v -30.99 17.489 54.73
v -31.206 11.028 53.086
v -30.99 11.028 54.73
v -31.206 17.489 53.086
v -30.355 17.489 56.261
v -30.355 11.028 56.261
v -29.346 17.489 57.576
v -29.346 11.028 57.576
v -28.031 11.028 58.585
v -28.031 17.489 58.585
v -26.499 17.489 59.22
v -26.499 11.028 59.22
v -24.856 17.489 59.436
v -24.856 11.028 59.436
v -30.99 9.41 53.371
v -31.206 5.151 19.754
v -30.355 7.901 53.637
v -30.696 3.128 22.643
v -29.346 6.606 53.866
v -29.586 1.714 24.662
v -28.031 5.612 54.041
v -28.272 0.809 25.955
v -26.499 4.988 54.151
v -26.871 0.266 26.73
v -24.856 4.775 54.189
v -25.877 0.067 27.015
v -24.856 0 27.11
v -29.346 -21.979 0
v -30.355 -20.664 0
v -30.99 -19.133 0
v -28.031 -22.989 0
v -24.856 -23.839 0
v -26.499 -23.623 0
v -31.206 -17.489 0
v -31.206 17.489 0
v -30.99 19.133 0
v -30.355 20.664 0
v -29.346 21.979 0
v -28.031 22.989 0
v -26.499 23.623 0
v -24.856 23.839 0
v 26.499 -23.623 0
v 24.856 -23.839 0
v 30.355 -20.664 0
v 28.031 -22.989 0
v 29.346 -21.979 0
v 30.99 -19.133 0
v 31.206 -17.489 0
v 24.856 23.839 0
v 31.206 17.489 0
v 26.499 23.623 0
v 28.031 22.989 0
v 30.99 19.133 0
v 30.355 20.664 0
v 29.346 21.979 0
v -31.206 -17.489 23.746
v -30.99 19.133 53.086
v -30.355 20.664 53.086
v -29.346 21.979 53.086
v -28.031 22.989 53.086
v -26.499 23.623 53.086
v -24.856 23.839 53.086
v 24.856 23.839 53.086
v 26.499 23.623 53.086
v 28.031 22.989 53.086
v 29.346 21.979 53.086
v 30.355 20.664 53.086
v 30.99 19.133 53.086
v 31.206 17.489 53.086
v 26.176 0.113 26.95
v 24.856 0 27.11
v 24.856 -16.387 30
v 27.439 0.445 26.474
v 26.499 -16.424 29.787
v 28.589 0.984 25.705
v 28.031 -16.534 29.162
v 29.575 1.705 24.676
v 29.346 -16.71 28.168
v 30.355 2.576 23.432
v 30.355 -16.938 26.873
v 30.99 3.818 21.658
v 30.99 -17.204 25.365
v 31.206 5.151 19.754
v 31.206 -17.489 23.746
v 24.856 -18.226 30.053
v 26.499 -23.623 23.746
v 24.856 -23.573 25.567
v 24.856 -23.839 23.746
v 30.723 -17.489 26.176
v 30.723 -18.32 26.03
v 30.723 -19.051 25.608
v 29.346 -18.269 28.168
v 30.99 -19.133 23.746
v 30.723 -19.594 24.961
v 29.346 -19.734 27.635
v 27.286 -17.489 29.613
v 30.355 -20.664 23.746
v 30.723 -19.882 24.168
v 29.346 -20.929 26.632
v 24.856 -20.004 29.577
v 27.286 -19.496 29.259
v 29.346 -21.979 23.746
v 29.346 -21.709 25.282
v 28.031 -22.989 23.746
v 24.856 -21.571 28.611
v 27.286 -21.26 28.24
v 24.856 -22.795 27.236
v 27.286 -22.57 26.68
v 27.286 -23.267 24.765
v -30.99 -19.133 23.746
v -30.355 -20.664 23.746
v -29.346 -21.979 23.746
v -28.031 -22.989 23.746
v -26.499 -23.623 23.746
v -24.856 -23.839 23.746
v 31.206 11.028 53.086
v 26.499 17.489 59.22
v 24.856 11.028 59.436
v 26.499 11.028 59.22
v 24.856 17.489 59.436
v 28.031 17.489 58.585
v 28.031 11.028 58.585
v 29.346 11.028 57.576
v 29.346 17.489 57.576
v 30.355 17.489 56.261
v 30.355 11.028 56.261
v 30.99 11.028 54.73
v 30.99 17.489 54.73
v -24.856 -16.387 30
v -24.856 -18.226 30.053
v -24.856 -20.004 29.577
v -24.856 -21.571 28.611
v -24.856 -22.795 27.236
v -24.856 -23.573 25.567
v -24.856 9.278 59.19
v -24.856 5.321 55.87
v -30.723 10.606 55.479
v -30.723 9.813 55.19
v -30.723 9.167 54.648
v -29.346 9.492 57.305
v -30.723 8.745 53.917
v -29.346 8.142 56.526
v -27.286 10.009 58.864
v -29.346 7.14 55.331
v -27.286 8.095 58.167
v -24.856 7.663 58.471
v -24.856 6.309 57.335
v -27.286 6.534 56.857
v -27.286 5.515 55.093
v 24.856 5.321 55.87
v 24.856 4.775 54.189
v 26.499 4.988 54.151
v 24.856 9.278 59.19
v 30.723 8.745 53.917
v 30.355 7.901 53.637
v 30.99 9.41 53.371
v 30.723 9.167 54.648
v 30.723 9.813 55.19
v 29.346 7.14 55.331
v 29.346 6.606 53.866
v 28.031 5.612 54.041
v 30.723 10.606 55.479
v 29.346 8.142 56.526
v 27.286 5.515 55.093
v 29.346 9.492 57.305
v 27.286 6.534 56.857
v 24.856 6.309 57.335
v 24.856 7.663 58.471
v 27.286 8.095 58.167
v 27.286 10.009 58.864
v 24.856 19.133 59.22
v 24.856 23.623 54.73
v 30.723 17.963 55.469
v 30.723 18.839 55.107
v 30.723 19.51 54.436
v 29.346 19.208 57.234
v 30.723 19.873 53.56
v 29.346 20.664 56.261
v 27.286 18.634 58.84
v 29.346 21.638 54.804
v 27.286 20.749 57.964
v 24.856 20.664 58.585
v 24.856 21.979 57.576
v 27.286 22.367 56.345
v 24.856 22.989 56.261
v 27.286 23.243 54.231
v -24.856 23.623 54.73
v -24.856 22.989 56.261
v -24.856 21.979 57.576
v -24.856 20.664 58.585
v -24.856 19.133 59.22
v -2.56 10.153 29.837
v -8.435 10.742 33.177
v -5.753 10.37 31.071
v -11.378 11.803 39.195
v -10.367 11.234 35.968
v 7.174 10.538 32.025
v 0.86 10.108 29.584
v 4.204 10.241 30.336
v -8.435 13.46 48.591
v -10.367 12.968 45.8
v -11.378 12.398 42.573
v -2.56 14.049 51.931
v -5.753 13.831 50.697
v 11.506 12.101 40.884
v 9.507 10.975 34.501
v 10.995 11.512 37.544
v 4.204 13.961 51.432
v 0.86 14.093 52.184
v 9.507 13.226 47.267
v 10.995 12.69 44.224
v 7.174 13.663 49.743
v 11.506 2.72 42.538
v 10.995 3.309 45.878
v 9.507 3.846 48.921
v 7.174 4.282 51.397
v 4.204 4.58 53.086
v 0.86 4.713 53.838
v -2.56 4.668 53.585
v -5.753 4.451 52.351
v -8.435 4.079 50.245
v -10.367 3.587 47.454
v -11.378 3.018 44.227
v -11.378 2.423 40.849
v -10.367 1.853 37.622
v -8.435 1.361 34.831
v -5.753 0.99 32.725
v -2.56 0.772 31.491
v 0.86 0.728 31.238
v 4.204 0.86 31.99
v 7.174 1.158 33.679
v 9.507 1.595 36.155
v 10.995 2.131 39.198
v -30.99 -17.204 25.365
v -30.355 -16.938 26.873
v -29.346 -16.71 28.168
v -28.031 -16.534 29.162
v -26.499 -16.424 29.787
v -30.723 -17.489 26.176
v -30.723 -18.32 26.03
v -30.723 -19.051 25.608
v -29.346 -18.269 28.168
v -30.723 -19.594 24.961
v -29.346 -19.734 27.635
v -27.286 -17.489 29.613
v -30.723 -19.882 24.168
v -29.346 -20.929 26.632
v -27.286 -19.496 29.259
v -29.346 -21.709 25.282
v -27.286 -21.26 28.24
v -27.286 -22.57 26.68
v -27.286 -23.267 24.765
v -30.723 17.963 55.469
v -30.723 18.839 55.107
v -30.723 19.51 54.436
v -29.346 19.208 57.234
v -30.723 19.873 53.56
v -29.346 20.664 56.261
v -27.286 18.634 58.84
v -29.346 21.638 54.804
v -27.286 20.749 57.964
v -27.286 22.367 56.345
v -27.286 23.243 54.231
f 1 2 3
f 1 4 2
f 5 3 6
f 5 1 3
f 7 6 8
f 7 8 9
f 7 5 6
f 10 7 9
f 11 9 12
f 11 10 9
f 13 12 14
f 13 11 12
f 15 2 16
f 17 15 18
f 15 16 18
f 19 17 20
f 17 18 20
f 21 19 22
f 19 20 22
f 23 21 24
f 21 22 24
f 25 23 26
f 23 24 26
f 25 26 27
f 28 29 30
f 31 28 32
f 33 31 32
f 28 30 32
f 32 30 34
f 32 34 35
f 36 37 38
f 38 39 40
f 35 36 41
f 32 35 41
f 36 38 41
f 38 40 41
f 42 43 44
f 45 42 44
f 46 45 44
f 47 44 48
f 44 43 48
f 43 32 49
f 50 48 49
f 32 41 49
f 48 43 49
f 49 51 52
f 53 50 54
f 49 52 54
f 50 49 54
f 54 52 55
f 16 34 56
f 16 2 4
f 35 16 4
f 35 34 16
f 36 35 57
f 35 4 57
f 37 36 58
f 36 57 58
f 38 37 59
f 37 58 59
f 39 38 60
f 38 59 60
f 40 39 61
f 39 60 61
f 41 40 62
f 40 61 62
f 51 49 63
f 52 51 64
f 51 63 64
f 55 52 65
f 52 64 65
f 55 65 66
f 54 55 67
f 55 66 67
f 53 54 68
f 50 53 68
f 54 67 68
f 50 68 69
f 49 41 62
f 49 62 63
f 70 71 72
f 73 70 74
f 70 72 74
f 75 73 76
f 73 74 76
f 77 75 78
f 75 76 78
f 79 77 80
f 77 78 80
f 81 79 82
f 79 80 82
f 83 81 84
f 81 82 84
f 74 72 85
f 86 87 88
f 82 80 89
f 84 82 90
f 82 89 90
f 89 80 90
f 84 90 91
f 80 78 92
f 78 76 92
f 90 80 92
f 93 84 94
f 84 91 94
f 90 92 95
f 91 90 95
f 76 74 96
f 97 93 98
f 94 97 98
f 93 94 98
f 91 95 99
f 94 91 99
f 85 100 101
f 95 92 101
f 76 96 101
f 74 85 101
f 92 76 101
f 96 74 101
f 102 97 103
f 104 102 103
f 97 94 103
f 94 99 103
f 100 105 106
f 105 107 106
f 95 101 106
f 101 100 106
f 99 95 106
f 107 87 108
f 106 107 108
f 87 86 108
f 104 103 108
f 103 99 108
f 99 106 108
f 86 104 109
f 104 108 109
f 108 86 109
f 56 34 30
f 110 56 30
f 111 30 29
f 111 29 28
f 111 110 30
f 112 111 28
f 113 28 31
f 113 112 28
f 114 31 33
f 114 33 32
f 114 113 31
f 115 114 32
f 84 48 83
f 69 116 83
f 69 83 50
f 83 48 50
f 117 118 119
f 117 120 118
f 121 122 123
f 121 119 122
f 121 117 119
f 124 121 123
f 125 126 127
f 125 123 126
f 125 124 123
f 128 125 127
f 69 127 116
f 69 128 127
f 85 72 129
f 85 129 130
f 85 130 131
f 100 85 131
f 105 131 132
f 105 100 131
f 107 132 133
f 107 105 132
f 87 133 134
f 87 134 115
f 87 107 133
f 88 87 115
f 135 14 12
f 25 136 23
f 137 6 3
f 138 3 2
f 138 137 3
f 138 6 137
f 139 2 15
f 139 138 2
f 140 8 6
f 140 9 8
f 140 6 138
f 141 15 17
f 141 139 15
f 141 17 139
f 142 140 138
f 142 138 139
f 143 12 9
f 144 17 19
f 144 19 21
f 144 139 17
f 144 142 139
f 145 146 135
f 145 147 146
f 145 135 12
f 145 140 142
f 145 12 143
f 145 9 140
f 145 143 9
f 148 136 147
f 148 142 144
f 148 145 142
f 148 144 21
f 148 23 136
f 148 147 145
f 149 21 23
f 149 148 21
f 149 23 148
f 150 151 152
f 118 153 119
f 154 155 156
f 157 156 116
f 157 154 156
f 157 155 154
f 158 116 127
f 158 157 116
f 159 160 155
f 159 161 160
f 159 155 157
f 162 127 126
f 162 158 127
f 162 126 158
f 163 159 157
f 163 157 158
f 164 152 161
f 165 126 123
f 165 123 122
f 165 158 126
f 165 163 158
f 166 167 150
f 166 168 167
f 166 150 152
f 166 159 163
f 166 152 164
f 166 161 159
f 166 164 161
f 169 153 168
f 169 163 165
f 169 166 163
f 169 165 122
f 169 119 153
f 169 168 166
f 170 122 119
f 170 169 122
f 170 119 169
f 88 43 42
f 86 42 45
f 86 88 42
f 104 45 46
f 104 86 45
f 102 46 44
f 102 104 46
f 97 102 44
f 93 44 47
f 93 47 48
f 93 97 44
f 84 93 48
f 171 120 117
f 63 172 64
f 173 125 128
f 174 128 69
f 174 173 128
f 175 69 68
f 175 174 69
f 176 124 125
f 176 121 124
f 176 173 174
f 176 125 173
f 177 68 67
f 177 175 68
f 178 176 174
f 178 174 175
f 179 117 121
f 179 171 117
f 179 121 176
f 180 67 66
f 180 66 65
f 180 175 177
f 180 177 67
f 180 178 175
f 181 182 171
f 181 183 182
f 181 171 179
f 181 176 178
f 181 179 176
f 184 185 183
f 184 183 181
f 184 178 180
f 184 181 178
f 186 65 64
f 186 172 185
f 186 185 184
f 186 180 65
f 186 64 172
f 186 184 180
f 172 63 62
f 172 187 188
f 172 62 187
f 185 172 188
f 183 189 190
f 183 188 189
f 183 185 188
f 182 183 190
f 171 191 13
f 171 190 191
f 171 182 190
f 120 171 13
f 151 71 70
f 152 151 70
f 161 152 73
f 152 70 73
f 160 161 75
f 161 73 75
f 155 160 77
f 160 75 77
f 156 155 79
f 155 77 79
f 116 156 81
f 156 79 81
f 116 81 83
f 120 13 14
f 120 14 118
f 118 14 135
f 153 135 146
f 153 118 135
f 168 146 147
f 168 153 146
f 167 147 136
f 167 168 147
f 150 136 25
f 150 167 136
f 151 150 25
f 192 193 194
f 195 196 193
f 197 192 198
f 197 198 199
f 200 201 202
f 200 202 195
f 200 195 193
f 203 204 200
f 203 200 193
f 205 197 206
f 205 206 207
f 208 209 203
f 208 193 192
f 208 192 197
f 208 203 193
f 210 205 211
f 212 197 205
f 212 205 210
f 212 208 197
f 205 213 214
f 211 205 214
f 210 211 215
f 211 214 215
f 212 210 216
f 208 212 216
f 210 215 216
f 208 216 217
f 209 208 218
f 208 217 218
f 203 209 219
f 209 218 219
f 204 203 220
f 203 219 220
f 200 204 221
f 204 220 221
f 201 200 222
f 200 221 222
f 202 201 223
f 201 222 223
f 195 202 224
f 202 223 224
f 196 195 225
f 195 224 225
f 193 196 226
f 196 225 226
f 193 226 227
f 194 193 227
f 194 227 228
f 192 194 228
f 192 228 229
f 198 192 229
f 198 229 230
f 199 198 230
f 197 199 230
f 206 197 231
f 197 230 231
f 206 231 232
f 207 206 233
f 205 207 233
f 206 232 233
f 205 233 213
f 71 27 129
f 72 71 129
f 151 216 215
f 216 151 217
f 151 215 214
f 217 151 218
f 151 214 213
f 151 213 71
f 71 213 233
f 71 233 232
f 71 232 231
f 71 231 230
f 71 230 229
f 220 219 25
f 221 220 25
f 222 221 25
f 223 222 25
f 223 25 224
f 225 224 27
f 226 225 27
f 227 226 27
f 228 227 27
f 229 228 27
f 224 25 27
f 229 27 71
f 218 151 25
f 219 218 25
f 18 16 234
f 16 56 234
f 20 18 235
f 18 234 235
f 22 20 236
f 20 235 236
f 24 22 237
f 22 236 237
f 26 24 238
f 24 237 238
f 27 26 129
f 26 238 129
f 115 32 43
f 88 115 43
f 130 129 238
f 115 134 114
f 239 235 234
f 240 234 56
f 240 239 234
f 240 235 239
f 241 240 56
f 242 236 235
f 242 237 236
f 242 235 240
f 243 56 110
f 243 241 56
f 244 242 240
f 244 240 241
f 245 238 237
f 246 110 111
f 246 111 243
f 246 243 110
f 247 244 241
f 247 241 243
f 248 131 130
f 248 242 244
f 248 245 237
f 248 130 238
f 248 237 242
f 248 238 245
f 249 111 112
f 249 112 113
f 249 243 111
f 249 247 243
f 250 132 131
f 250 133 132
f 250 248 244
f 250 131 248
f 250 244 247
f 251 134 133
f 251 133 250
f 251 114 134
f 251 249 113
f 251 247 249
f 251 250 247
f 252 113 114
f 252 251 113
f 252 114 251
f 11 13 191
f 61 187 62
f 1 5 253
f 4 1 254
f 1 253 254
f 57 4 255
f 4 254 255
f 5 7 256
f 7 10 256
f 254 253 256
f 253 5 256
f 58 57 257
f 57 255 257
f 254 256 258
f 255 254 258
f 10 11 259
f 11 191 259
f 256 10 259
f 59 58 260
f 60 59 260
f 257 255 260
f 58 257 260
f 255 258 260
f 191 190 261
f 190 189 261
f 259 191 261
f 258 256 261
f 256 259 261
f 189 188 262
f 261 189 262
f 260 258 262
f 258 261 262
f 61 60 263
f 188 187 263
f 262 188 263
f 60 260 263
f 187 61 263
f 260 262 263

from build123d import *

# Parameters (mm, degrees)
F0_W     = 62.4118931592
F0_H     = 47.6785954088
F1_DEPTH = 59.436
F3_DEPTH = 62.4128931592
F4_R     = 11.5061278917
F5_DEPTH = 9.525
F6_R     = 6.35


with BuildPart() as f1:
    # F0 (on Top) → F1 (new body)
    with BuildSketch(Plane.XY):
        Rectangle(F0_W, F0_H)
    extrude(amount=F1_DEPTH)

    # F2 (on face) → F3 (cut, through all)
    with BuildSketch(Plane(origin=(-31.2059465796, 0, 0), x_dir=(0, -1, 0), z_dir=(-1, 0, 0))):
        Polygon((23.8392977044, 59.436), (-5.6998856858, 59.436), (0, 27.1103419363), (23.8392977044, 31.3138533228), align=None)
    extrude(amount=-F3_DEPTH, mode=Mode.SUBTRACT)

    # F4 (on face) → F5 (cut)
    with BuildSketch(Plane(origin=(0, -4.6361415173, 0.8174768359), x_dir=(1, 0, 0), z_dir=(0, -0.984807753, 0.1736481777))):
        with Locations((0, 42.3641316593)):
            Circle(F4_R)
    extrude(amount=-F5_DEPTH, mode=Mode.SUBTRACT)

    # F6
    f6_edges = [f1.edges().sort_by_distance(p)[0] for p in [
        (0, 23.839298, 59.436),
        (31.205947, 14.769592, 59.436),
        (0, 5.699886, 59.436),
        (-31.205947, 14.769592, 59.436),
        (-31.205947, -23.839298, 15.656927),
        (31.205947, -23.839298, 15.656927),
        (0, -23.839298, 31.313853),
        (-31.205947, -11.919649, 29.212098),
        (-31.205947, 2.849943, 43.273171),
        (31.205947, -11.919649, 29.212098),
        (31.205947, 2.849943, 43.273171),
        (31.205947, 23.839298, 29.718),
        (-31.205947, 23.839298, 29.718),
    ]]
    fillet(f6_edges, radius=F6_R)


solid = f1.part
